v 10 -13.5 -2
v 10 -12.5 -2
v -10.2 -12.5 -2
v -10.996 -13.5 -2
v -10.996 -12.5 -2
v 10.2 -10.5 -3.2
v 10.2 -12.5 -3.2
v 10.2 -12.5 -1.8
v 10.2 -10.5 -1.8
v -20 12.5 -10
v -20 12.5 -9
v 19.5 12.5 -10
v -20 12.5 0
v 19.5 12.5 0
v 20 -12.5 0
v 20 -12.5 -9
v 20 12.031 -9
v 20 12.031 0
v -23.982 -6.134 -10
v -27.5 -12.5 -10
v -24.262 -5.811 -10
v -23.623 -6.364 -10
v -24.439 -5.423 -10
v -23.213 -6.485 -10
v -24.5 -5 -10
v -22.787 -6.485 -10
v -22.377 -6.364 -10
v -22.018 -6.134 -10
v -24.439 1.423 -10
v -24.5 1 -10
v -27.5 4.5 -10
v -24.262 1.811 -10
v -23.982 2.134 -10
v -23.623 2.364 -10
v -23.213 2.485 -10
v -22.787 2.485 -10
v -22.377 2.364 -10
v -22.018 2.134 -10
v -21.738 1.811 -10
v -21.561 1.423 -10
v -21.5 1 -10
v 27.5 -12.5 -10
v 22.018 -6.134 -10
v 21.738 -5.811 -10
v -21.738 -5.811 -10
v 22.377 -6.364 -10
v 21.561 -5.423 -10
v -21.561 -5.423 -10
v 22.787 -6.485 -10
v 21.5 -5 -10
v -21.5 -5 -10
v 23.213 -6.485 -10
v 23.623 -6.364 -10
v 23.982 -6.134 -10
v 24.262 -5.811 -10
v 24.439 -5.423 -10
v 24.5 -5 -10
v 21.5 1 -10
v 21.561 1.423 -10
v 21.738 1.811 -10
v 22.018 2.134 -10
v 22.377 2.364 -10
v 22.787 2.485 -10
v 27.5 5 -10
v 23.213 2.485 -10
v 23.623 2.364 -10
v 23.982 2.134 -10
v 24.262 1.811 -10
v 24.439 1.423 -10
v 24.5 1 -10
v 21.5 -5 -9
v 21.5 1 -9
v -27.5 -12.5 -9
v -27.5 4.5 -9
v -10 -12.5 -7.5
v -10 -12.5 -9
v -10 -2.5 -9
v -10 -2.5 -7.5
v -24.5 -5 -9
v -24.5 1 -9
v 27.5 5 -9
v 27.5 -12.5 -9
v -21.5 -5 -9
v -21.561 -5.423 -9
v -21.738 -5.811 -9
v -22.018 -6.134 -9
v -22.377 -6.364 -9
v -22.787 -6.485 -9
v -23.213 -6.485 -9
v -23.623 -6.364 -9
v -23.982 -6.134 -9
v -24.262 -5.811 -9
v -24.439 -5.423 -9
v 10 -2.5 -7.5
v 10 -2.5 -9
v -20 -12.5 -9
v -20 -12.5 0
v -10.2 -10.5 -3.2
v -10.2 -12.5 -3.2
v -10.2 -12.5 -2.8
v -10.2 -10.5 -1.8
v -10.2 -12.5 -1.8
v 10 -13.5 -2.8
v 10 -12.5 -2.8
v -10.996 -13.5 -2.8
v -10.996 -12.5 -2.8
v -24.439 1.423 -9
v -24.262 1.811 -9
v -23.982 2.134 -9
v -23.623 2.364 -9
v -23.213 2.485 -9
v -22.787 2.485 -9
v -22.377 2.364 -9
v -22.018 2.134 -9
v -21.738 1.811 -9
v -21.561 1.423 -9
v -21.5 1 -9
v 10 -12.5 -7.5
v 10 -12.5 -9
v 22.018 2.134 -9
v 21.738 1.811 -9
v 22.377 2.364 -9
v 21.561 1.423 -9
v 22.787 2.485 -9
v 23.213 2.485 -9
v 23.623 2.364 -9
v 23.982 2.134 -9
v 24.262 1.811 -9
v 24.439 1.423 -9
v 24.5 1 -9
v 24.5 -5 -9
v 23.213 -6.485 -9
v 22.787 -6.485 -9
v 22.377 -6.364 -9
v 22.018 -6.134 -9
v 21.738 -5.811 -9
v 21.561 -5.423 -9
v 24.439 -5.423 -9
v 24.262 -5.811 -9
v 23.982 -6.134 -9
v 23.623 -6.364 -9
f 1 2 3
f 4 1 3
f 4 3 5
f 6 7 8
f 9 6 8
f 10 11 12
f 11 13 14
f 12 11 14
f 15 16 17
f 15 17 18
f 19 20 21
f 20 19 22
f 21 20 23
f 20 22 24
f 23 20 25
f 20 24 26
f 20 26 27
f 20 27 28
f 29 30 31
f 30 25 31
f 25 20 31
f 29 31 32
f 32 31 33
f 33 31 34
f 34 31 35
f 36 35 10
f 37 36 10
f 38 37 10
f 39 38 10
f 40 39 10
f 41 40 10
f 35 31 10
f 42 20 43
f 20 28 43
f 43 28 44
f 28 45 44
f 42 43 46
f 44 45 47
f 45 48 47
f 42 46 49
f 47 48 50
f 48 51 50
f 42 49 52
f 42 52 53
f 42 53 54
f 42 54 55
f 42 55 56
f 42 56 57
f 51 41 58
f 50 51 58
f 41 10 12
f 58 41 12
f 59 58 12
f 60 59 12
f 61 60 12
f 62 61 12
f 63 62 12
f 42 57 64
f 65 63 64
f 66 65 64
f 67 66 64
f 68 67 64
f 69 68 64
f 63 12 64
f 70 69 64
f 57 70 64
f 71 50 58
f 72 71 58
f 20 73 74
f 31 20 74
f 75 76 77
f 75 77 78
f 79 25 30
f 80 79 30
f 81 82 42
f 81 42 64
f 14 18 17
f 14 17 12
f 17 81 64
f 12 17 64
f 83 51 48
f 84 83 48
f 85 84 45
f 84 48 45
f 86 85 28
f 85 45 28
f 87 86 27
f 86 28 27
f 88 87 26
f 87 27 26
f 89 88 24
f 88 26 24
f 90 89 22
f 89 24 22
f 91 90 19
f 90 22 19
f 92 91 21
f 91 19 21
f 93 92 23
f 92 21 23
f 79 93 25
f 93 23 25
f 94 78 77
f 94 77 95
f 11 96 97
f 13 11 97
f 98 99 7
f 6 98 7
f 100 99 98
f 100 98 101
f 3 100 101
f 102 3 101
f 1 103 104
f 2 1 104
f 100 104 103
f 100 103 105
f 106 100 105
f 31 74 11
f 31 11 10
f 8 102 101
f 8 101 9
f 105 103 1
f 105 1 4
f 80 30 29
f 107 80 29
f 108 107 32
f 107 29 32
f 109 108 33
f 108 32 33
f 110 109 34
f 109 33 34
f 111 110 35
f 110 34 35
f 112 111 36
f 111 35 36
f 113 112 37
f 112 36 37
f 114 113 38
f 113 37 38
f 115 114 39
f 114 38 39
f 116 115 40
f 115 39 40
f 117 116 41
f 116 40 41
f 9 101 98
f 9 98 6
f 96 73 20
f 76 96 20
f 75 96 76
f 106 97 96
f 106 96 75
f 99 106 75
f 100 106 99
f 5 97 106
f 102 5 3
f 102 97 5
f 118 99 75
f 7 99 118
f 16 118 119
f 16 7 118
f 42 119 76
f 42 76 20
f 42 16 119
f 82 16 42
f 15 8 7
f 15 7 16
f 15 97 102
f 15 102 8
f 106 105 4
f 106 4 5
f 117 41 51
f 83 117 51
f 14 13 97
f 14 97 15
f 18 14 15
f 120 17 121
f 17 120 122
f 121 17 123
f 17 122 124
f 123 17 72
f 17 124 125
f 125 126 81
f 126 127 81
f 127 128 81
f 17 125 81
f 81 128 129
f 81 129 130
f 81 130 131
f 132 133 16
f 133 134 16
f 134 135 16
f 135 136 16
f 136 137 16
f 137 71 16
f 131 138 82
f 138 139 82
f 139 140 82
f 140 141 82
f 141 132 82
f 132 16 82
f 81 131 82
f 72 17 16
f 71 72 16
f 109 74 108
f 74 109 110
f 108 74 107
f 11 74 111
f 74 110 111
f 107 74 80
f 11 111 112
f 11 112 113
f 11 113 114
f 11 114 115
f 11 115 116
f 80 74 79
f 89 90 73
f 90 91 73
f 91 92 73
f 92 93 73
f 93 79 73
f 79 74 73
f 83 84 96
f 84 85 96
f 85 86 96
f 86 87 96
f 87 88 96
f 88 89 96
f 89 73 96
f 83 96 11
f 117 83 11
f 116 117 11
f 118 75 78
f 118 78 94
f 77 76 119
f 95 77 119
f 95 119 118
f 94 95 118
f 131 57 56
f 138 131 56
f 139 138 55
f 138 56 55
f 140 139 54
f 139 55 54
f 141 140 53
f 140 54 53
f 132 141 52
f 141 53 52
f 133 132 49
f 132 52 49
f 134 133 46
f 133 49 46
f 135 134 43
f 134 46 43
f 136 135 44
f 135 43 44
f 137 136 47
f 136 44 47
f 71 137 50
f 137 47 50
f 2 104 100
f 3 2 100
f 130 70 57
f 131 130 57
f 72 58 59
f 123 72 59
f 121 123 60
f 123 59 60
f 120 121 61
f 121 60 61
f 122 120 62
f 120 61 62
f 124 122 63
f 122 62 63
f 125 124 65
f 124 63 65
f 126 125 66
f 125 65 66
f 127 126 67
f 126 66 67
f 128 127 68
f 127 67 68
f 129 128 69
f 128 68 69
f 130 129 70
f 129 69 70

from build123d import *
from OCP.BRepFilletAPI import BRepFilletAPI_MakeChamfer

# Parameters (mm, degrees)
SKETCH_1_W          = 55
SKETCH_1_H          = 25
EXTRUDE_1_DEPTH     = 10
SKETCH_2_W          = 20.4
SKETCH_2_H          = 1.4
CUT_EXTRUDE_1_DEPTH = 2
SKETCH_3_W          = 7.5
SKETCH_3_H          = 9
CUT_EXTRUDE_2_DEPTH = 39.487010796
SKETCH_4_W          = 7.5
SKETCH_4_H          = 9
CUT_EXTRUDE_3_DEPTH = 39.487010796
CUT_EXTRUDE_4_DEPTH = 32.819805153
CUT_EXTRUDE_5_DEPTH = 32.819805153
SKETCH_7_W          = 20.995896459
SKETCH_7_H          = 1
EXTRUDE_2_DEPTH     = 0.8
SKETCH_8_W          = 20
SKETCH_8_H          = 1.5
CUT_EXTRUDE_6_DEPTH = 10
CHAMFER_1_SIZE      = 8
CHAMFER_1_SIZE2     = 7.5


with BuildPart() as part:
    # 草图1 → 凸台-拉伸1 (new body)
    with BuildSketch(Plane.XY):
        Rectangle(SKETCH_1_W, SKETCH_1_H)
    extrude(amount=-EXTRUDE_1_DEPTH)

    # 草图2 → 切除-拉伸1 (cut)
    with BuildSketch(Plane.XZ.offset(12.5)):
        with Locations((0, -2.5)):
            Rectangle(SKETCH_2_W, SKETCH_2_H)
    extrude(amount=-CUT_EXTRUDE_1_DEPTH, mode=Mode.SUBTRACT)

    # 草图3 → 切除-拉伸2 (cut, through all)
    with BuildSketch(Plane.XZ.offset(12.5)):
        with Locations((-23.75, -4.5)):
            Rectangle(SKETCH_3_W, SKETCH_3_H)
    extrude(amount=-CUT_EXTRUDE_2_DEPTH, mode=Mode.SUBTRACT)

    # 草图4 → 切除-拉伸3 (cut, through all)
    with BuildSketch(Plane.XZ.offset(12.5)):
        with Locations((23.75, -4.5)):
            Rectangle(SKETCH_4_W, SKETCH_4_H)
    extrude(amount=-CUT_EXTRUDE_3_DEPTH, mode=Mode.SUBTRACT)

    # 草图5 → 切除-拉伸4 (cut, through all)
    with BuildSketch(Plane(origin=(0, 0, -10), x_dir=(-1, 0, 0), z_dir=(0, 0, -1))):
        with BuildLine():
            Line((21.5, 1), (21.5, -5))
            ThreePointArc((21.5, -5), (23, -6.5), (24.5, -5))
            Line((24.5, -5), (24.5, 1))
            ThreePointArc((24.5, 1), (23, 2.5), (21.5, 1))
        make_face()
    extrude(amount=-CUT_EXTRUDE_4_DEPTH, mode=Mode.SUBTRACT)

    # 草图6 → 切除-拉伸5 (cut, through all)
    with BuildSketch(Plane(origin=(0, 0, -10), x_dir=(-1, 0, 0), z_dir=(0, 0, -1))):
        with BuildLine():
            Line((-24.5, 1), (-24.5, -5))
            ThreePointArc((-24.5, -5), (-23, -6.5), (-21.5, -5))
            Line((-21.5, -5), (-21.5, 1))
            ThreePointArc((-21.5, 1), (-23, 2.5), (-24.5, 1))
        make_face()
    extrude(amount=-CUT_EXTRUDE_5_DEPTH, mode=Mode.SUBTRACT)

    # 草图7 → 凸台-拉伸2 (add)
    with BuildSketch(Plane(origin=(0, 0, -2.8), x_dir=(-1, 0, 0), z_dir=(0, 0, -1))):
        with Locations((0.49794823, -13)):
            Rectangle(SKETCH_7_W, SKETCH_7_H)
    extrude(amount=-EXTRUDE_2_DEPTH)

    # 草图8 → 切除-拉伸6 (cut)
    with BuildSketch(Plane.XZ.offset(12.5)):
        with Locations((0, -8.25)):
            Rectangle(SKETCH_8_W, SKETCH_8_H)
    extrude(amount=-CUT_EXTRUDE_6_DEPTH, mode=Mode.SUBTRACT)

    # 倒角1: one chamfer whose edges measure the first distance from different faces: ONE call of the kernel's chamfer builder (chamfer() names one face for all edges)
    chamfer_1_edges_1 = [part.edges().sort_by_distance(p)[0] for p in [
        (27.5, 12.5, -9.5),
    ]]
    chamfer_1_side_1 = [part.faces().sort_by_distance(p)[0] for p in [
        (0, 12.5, -5.162650602),
    ]]
    chamfer_1_edges_2 = [part.edges().sort_by_distance(p)[0] for p in [
        (-27.5, 12.5, -9.5),
    ]]
    chamfer_1_side_2 = [part.faces().sort_by_distance(p)[0] for p in [
        (-27.5, 0, -9.5),
    ]]
    chamfer_1 = BRepFilletAPI_MakeChamfer(part.part.solid().wrapped)
    for e in chamfer_1_edges_1:
        chamfer_1.Add(CHAMFER_1_SIZE, CHAMFER_1_SIZE2, e.wrapped, chamfer_1_side_1[0].wrapped)  # the first distance lies on this face
    for e in chamfer_1_edges_2:
        chamfer_1.Add(CHAMFER_1_SIZE, CHAMFER_1_SIZE2, e.wrapped, chamfer_1_side_2[0].wrapped)  # the first distance lies on this face
    add(Compound.cast(chamfer_1.Shape()), mode=Mode.REPLACE)


solid = part.part
